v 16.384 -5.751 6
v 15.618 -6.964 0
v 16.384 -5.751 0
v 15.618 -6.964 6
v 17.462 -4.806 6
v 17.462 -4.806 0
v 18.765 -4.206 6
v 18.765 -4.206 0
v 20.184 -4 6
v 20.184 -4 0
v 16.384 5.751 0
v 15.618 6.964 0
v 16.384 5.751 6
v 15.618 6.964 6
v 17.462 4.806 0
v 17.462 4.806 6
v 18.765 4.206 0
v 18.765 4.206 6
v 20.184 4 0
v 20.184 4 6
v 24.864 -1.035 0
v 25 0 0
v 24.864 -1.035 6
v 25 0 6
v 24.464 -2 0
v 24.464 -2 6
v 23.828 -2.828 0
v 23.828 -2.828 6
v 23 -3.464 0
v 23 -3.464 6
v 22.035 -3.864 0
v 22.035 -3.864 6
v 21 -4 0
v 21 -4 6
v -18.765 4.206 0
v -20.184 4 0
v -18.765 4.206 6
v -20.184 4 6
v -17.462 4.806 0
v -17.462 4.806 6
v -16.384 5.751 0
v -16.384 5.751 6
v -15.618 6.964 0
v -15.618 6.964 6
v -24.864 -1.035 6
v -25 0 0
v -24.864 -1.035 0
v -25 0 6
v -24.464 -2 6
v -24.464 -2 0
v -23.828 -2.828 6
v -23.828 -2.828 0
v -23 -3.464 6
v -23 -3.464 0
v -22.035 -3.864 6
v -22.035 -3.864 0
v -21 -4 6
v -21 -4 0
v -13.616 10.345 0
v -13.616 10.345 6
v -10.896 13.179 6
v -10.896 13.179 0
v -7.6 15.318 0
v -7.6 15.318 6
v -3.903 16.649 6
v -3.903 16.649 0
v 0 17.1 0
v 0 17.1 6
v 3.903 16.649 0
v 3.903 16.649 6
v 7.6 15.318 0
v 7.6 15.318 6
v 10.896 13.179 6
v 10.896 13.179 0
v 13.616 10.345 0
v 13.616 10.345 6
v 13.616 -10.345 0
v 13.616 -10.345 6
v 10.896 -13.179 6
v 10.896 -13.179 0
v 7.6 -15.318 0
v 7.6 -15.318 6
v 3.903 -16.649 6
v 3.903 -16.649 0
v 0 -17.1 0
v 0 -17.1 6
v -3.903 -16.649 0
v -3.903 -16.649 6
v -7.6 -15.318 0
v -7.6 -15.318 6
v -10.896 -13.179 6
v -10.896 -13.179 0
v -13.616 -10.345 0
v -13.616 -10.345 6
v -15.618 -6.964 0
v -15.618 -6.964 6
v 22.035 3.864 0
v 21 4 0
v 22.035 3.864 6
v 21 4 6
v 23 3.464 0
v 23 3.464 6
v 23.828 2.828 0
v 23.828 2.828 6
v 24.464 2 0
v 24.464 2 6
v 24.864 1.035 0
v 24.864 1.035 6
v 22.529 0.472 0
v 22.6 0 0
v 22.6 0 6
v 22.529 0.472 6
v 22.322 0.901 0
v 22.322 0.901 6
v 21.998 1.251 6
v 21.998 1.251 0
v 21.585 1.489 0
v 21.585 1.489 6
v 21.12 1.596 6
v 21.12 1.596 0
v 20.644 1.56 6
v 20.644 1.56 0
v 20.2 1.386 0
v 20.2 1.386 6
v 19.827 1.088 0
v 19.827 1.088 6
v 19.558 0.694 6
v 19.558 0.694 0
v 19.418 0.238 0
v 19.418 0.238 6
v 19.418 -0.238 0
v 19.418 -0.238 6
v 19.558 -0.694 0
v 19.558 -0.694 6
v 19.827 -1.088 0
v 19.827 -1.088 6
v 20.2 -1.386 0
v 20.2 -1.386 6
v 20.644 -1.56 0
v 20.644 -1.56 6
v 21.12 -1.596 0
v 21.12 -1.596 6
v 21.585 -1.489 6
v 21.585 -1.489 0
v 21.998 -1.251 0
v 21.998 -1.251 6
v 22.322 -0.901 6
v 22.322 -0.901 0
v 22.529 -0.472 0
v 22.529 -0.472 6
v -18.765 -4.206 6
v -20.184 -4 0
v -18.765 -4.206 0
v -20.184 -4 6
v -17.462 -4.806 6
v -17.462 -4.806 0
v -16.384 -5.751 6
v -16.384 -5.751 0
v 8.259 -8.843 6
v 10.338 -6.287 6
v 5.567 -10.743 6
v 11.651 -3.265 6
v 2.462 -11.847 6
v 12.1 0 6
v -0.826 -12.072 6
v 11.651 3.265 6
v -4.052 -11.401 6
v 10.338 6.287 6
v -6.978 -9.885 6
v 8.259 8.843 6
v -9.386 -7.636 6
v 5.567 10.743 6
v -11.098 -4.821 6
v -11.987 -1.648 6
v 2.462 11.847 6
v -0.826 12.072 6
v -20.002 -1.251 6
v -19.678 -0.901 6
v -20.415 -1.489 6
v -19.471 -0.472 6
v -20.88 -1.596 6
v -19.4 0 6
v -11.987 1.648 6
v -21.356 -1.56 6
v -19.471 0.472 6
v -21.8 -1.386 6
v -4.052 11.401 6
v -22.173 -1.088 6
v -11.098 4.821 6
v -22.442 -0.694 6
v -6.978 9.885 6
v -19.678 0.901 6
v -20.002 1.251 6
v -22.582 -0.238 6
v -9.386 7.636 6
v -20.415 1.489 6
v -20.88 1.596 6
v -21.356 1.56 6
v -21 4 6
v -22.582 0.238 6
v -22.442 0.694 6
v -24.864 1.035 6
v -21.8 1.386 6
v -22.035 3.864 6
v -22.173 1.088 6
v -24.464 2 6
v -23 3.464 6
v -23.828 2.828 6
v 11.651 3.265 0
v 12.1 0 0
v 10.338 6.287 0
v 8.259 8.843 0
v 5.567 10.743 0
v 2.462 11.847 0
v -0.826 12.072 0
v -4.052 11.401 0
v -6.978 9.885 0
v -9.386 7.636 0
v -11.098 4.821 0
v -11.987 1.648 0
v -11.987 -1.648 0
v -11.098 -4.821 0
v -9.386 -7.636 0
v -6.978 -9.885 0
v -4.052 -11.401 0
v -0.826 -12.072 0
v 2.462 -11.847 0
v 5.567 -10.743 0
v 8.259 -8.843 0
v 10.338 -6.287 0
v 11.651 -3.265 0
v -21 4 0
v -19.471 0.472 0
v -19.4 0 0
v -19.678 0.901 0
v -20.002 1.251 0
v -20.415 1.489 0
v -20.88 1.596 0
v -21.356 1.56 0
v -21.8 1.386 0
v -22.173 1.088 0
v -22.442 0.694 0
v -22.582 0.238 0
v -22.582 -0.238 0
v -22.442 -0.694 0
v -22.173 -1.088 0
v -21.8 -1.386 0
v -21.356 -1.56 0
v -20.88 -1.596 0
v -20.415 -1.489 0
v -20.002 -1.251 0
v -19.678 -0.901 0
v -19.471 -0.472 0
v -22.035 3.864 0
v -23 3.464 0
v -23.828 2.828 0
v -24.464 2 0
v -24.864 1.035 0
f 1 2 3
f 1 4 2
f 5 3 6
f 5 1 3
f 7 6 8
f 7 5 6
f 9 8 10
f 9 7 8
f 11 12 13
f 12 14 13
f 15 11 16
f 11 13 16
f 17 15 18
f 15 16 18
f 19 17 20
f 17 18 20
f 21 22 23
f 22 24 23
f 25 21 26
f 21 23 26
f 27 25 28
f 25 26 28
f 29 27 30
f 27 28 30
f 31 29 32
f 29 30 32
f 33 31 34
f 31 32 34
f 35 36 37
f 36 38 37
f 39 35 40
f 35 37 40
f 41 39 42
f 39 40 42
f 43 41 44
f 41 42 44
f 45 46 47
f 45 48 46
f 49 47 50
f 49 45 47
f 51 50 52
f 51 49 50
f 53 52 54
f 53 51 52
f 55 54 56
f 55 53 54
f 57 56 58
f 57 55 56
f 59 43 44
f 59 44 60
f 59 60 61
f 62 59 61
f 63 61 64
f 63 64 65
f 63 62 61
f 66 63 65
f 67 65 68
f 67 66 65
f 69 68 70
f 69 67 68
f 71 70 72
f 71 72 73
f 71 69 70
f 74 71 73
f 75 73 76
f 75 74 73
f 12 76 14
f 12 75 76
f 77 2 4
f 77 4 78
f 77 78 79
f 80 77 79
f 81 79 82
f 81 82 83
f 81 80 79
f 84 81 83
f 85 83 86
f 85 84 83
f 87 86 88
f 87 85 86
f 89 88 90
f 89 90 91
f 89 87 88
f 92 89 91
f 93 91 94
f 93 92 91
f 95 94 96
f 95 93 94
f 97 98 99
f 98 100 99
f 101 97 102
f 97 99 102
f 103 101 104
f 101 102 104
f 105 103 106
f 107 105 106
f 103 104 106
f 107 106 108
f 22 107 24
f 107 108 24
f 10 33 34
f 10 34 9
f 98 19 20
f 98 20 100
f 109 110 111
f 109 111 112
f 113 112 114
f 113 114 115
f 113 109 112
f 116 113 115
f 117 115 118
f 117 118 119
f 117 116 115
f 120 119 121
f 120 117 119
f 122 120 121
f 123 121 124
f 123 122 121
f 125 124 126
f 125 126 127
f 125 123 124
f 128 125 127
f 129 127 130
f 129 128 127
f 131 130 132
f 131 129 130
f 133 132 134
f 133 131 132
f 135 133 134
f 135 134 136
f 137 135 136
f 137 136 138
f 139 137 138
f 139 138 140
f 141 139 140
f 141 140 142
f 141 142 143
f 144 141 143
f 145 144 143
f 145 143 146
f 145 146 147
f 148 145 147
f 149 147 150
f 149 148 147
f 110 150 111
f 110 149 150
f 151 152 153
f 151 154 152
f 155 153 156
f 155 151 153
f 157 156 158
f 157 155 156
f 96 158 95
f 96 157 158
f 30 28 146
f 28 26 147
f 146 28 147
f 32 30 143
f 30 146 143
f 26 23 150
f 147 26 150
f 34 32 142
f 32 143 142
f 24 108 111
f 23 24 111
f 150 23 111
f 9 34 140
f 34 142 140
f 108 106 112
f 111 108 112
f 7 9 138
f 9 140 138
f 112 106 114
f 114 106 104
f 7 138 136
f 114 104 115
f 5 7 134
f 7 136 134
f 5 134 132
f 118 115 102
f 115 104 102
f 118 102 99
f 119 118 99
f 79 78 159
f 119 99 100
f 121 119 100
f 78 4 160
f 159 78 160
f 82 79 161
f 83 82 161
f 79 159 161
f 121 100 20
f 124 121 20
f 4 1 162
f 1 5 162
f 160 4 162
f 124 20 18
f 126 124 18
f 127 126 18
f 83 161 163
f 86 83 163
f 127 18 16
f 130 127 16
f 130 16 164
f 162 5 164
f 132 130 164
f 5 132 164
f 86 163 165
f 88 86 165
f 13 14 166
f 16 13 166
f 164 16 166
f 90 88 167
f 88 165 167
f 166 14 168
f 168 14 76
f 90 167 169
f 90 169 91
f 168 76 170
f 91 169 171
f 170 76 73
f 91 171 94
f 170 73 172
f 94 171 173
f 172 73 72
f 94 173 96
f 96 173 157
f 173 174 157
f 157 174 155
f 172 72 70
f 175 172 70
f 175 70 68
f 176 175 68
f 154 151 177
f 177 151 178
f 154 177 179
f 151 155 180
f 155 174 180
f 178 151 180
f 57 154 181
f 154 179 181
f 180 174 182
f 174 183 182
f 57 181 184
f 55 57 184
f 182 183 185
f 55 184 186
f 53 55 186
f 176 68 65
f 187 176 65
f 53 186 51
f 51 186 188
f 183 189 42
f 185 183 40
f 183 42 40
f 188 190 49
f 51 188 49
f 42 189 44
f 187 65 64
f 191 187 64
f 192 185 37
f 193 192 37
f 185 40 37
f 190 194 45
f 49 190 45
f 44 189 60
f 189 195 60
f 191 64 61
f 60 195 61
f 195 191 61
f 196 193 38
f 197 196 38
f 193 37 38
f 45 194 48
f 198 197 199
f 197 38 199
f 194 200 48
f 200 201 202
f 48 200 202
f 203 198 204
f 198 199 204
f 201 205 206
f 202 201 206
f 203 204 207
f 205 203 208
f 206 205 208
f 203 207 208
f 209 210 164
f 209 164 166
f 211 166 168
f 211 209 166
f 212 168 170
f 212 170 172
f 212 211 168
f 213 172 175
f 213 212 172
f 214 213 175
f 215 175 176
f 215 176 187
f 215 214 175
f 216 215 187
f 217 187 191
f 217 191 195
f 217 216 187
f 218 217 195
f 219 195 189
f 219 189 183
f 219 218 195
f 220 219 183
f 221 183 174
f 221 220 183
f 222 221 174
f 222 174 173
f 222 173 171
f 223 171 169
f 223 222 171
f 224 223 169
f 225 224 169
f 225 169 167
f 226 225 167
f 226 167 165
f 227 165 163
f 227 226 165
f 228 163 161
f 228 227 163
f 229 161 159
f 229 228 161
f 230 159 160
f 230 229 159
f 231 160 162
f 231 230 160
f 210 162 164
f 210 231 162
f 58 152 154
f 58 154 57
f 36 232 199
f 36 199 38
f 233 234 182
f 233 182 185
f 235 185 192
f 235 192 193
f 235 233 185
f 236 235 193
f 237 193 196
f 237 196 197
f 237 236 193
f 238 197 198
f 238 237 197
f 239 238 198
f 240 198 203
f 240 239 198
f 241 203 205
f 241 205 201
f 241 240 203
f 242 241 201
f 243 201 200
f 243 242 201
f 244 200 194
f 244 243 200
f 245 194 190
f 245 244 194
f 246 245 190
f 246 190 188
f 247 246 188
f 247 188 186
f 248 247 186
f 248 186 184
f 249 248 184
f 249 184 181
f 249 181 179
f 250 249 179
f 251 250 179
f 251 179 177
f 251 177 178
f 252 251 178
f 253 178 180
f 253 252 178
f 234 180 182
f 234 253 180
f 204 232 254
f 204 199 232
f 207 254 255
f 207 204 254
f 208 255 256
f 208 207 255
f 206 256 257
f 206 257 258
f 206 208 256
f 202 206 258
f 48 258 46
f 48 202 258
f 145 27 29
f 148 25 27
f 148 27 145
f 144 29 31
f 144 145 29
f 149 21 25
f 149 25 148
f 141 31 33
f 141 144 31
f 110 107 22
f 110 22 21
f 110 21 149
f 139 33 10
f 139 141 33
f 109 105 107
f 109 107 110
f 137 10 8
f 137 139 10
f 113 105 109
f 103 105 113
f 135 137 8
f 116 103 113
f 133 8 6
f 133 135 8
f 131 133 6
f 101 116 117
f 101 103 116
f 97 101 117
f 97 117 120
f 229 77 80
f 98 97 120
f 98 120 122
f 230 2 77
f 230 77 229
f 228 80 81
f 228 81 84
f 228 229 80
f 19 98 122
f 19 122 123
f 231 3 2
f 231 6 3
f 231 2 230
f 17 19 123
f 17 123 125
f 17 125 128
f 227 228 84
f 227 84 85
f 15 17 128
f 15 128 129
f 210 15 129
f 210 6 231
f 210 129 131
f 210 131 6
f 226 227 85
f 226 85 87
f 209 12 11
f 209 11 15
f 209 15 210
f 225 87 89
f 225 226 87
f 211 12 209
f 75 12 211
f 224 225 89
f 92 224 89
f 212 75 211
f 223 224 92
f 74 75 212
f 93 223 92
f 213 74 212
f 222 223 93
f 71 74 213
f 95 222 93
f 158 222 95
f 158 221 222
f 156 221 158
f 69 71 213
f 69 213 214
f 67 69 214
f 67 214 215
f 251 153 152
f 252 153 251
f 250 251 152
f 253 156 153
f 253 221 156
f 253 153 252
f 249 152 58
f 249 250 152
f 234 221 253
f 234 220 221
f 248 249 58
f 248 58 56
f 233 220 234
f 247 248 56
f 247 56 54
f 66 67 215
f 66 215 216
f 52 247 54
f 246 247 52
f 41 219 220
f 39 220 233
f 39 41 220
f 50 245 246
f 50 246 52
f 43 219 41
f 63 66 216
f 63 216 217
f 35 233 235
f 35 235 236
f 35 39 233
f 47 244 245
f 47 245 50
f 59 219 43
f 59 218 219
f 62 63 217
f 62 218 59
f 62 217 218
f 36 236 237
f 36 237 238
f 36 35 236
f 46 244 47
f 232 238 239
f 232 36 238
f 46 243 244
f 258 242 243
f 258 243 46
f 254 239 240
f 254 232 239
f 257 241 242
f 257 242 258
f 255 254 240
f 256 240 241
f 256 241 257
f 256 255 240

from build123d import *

# Parameters (mm, degrees)
ESBO_O1_R                = 12.1
ESBO_O1_R_2              = 1.6
RESSALTO_EXTRUS_O1_DEPTH = 6
FILETE2_R                = 5
FILETE3_R                = 4


with BuildPart() as part:
    # Esboço1 → Ressalto-extrusão1 (new body)
    with BuildSketch(Plane.XY):
        with BuildLine():
            Line((-25, 4), (-16.625582697, 4))
            ThreePointArc((-16.625582697, 4), (0, 17.1), (16.625582697, 4))
            Line((16.625582697, 4), (25, 4))
            Line((25, 4), (25, -4))
            Line((25, -4), (16.625582697, -4))
            ThreePointArc((16.625582697, -4), (0, -17.1), (-16.625582697, -4))
            Line((-16.625582697, -4), (-25, -4))
            Line((-25, -4), (-25, 4))
        make_face()
        Circle(ESBO_O1_R, mode=Mode.SUBTRACT)
        with Locations((-21, 0)):
            Circle(ESBO_O1_R_2, mode=Mode.SUBTRACT)
        with Locations((21, 0)):
            Circle(ESBO_O1_R_2, mode=Mode.SUBTRACT)
    extrude(amount=RESSALTO_EXTRUS_O1_DEPTH)

    # Filete2
    filete2_edges = [part.edges().sort_by_distance(p)[0] for p in [
        (-16.625582697, 4, 3),
        (16.625582697, 4, 3),
        (16.625582697, -4, 3),
        (-16.625582697, -4, 3),
    ]]
    fillet(filete2_edges, radius=FILETE2_R)

    # Filete3
    filete3_edges = [part.edges().sort_by_distance(p)[0] for p in [
        (25, -4, 3),
        (25, 4, 3),
        (-25, -4, 3),
        (-25, 4, 3),
    ]]
    fillet(filete3_edges, radius=FILETE3_R - 0.0001)  # a hair under: the kernel refuses the full size


solid = part.part
